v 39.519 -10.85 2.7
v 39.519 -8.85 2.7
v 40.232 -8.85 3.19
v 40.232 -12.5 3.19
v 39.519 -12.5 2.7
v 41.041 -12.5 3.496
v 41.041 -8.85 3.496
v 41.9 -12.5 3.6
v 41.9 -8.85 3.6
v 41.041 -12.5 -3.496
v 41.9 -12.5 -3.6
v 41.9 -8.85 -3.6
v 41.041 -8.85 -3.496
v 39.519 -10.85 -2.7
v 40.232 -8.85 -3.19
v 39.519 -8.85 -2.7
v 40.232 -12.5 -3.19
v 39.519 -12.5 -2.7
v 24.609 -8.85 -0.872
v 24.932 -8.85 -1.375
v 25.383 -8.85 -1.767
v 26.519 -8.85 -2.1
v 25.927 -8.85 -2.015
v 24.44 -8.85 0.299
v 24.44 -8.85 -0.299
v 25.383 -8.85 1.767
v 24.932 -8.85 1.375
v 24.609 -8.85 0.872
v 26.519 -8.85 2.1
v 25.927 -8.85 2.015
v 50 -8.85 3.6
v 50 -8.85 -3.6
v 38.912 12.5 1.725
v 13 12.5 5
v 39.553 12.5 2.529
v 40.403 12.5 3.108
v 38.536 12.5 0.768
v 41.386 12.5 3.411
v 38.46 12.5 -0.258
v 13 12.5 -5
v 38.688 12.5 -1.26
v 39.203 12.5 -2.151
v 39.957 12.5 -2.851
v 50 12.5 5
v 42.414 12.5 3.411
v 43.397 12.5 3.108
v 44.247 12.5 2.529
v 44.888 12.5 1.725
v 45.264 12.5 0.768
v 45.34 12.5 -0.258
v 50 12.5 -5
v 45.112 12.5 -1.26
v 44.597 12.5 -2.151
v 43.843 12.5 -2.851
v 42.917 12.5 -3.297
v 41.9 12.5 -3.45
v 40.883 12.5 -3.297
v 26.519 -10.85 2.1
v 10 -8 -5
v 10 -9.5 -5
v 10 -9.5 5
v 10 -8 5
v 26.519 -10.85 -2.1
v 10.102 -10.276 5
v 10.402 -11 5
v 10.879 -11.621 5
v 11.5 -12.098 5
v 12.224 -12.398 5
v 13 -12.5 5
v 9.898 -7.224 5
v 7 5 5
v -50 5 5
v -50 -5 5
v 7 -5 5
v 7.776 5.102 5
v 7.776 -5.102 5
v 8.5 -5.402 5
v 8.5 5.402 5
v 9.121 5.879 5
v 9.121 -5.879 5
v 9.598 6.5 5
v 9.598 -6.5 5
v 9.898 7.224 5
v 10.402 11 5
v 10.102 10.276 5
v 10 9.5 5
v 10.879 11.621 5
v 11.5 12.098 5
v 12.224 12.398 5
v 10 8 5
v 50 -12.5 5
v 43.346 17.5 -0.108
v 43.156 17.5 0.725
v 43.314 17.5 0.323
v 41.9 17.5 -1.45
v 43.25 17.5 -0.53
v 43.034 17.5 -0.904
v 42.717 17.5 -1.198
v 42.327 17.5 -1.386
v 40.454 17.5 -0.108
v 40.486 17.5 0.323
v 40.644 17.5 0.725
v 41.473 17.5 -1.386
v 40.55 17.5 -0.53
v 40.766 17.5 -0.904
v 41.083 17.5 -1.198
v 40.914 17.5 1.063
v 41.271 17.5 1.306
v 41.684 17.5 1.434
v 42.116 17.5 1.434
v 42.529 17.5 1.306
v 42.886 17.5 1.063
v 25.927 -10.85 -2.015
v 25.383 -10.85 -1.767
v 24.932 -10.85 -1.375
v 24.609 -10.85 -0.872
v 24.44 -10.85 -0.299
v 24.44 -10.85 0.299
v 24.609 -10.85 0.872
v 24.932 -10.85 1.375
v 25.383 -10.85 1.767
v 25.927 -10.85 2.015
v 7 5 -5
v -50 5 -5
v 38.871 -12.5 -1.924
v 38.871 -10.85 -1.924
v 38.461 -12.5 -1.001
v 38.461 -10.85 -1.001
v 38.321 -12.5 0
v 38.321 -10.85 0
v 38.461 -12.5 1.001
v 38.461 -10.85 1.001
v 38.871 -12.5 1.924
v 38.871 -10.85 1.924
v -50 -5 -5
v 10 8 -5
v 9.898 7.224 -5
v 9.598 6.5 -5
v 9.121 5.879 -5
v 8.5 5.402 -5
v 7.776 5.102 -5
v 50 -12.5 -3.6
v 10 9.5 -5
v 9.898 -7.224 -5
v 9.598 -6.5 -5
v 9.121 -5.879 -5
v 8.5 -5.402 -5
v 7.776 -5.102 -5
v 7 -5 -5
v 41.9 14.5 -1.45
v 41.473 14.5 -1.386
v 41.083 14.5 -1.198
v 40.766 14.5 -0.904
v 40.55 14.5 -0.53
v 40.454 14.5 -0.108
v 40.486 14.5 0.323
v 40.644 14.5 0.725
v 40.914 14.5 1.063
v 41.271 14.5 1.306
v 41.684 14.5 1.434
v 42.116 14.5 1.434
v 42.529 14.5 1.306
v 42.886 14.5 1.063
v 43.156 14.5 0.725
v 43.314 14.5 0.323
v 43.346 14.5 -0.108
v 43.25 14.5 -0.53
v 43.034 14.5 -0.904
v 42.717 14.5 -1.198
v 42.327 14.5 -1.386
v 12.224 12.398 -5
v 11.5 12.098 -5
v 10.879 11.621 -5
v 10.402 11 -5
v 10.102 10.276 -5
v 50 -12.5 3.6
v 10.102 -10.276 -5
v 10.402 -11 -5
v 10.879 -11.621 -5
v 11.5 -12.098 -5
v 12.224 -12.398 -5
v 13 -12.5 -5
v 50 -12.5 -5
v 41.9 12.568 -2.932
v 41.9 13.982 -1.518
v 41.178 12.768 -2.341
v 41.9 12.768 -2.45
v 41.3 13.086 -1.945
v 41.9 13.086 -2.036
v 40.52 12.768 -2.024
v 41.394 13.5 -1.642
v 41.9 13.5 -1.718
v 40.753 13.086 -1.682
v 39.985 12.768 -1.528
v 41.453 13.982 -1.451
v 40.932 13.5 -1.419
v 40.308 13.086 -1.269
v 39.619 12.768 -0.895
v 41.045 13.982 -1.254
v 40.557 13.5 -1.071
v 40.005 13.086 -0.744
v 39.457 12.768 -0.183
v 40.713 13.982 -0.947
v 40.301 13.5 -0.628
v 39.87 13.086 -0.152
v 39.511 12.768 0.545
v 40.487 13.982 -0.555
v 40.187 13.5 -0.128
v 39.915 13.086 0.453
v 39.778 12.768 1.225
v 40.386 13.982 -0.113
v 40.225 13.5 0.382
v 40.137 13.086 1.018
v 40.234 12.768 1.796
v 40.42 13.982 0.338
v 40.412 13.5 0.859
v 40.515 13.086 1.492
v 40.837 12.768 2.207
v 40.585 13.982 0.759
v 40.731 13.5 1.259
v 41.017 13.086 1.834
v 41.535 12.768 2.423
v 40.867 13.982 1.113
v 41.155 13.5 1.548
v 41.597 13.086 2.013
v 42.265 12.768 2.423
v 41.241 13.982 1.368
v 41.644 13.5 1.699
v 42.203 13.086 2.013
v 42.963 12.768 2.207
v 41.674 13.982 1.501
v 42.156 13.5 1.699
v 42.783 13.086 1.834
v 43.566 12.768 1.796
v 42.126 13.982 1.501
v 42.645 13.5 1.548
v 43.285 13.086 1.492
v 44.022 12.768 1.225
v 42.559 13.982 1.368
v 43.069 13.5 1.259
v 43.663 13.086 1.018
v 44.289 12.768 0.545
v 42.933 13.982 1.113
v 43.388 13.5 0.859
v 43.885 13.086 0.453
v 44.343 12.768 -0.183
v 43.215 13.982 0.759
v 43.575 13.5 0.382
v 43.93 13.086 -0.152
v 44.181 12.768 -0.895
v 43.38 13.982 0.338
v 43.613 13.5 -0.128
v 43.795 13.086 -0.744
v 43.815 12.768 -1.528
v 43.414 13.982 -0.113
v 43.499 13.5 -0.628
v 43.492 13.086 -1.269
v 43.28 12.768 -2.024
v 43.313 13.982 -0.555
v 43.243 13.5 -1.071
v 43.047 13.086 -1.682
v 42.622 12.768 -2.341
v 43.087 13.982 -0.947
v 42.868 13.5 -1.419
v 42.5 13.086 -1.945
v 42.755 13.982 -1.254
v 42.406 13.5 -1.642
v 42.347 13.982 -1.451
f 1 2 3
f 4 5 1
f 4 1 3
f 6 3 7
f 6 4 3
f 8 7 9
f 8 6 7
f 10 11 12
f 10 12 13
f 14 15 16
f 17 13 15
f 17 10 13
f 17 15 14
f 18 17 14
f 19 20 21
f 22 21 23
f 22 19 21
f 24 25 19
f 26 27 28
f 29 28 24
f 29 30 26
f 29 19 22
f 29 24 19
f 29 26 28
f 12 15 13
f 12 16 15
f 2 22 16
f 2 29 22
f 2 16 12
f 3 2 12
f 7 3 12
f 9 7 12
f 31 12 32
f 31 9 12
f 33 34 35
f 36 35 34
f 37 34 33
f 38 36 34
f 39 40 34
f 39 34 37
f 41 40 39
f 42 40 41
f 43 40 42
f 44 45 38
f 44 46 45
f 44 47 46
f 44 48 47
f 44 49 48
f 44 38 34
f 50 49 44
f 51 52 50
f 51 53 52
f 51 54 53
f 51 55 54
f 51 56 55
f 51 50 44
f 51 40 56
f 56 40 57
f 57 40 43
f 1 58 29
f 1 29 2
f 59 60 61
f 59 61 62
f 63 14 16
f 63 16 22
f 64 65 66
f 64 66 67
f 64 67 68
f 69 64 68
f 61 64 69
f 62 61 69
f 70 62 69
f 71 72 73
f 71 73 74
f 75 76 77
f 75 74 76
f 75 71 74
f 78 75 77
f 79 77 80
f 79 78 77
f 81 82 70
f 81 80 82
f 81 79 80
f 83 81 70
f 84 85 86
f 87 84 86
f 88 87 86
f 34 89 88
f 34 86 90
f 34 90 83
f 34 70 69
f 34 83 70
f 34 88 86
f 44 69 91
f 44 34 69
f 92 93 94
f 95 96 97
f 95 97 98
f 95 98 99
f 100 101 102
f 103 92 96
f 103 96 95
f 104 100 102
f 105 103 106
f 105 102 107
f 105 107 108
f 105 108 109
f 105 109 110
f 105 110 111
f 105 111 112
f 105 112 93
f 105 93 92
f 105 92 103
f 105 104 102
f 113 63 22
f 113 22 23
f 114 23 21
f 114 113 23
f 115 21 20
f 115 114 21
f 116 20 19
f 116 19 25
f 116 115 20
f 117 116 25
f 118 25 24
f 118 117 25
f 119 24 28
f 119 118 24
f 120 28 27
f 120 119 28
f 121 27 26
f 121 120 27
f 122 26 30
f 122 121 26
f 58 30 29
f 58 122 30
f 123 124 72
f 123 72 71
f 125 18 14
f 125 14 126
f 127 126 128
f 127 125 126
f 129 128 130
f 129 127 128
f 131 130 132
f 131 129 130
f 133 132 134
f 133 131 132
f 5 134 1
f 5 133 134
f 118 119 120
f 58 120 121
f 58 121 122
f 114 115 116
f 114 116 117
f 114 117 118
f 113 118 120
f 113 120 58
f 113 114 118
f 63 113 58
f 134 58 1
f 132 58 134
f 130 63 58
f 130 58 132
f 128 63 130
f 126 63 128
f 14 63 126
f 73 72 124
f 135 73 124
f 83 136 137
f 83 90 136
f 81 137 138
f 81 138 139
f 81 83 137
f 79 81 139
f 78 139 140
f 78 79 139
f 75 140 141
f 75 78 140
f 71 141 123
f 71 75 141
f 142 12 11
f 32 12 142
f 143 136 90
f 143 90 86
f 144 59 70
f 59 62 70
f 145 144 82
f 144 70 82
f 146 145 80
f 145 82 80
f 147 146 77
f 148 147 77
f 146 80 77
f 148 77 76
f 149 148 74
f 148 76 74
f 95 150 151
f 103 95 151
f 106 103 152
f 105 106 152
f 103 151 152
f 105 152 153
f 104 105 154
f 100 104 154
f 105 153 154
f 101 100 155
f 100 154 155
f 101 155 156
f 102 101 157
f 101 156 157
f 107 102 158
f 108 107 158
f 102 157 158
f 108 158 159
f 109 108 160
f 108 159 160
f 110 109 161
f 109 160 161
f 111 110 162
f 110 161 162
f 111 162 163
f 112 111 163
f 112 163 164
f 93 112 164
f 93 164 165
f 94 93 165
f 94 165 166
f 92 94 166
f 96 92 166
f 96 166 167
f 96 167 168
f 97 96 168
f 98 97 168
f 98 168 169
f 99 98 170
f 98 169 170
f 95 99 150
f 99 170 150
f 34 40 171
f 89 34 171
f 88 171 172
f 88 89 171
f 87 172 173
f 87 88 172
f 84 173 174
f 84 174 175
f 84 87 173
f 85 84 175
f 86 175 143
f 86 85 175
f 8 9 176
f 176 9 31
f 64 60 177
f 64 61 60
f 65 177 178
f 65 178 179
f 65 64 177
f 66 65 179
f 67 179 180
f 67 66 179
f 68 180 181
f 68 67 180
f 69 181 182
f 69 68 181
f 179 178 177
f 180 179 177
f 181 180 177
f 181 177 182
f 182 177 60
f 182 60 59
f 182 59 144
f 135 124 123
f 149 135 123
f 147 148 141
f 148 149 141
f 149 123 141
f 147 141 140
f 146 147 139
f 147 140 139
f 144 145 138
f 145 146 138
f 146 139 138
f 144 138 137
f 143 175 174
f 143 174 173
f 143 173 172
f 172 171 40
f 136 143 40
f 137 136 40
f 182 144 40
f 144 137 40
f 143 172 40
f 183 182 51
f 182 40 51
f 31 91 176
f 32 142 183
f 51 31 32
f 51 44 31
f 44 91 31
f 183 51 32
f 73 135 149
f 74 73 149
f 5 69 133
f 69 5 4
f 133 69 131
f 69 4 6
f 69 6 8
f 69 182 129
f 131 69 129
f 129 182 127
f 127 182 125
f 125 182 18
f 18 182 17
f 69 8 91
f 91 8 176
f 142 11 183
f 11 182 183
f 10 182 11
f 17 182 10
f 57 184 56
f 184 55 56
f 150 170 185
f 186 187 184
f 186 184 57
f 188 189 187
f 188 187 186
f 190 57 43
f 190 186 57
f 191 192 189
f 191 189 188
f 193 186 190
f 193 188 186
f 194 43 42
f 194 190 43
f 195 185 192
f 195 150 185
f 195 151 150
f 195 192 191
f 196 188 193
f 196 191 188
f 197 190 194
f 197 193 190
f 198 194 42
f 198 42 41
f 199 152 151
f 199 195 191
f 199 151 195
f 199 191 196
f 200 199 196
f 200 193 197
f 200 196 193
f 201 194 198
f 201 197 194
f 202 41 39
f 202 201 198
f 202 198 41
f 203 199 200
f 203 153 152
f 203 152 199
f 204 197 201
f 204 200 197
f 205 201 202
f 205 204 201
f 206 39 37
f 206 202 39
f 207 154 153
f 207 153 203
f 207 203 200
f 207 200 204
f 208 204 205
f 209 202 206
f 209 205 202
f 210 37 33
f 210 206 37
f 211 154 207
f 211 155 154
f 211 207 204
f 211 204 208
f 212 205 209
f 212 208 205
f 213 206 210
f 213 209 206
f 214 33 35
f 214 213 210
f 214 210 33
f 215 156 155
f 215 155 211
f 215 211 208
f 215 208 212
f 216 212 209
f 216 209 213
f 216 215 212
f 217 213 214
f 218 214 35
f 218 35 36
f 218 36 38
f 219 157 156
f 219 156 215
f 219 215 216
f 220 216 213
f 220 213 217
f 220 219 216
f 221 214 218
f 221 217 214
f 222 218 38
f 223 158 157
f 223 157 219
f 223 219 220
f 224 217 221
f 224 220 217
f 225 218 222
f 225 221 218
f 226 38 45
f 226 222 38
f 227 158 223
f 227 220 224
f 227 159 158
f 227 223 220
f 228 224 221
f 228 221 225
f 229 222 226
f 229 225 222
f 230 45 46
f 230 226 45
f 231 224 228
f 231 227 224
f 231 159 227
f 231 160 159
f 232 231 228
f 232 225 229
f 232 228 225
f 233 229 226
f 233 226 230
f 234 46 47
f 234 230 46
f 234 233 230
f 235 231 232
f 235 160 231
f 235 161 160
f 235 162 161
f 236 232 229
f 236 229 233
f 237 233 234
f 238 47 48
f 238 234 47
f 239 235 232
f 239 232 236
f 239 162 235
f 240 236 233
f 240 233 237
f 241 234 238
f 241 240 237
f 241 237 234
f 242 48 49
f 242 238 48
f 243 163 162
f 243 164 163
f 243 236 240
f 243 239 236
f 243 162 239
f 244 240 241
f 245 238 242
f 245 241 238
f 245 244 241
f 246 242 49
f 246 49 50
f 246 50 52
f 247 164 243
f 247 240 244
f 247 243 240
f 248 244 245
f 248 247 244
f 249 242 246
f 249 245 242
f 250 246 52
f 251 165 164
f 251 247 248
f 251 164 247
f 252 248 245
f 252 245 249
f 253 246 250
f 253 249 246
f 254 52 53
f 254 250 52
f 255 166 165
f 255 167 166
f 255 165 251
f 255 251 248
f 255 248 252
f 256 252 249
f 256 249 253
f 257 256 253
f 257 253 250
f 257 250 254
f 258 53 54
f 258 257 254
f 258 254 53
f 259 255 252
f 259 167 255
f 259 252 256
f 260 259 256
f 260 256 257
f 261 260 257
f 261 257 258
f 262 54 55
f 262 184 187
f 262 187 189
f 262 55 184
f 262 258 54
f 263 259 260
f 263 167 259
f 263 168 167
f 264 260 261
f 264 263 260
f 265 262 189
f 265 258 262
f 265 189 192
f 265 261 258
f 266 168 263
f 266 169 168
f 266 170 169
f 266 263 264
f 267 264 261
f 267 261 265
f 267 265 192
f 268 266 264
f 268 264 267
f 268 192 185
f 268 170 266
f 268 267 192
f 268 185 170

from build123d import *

# Parameters (mm, degrees)
SKETCH2_W               = 100
SKETCH2_H               = 10
BOSS_EXTRUDE2_DEPTH     = 12.5
CAVITY1_START           = -10.85
CAVITY1_OUTLINE_R       = 1.325
CAVITY1_DEPTH           = 2
CAVITY1_START_2         = -12.5
CAVITY1_2_OUTLINE_R     = 2.1
CAVITY1_2_DEPTH         = 1.65
CUT_EXTRUDE1_START      = -3.65
SKETCH3_R               = 2.1
CUT_EXTRUDE1_DEPTH      = 3.65
SKETCH4_W               = 8.1
SKETCH4_H               = 7.2
CUT_EXTRUDE2_DEPTH      = 3.65
SKETCH5_R               = 1.45
BOSS_EXTRUDE3_DEPTH     = 5
FILLET1_R               = 2
CUT_EXTRUDE3_DEPTH      = 54.909646632
CUT_EXTRUDE3_DEPTH_BACK = 54.909646632
SKETCH6_W               = 60
SKETCH6_H               = 7.5
FILLET2_R               = 3


# Read off the part's stored shape, not the designer's step: Cavity1
with BuildPart() as part:
    # Sketch2 → Boss-Extrude2 (new, symmetric)
    with BuildSketch(Plane(origin=(0, 0, 0), x_dir=(1, 0, 0), z_dir=(0, 1, 0))):
        Rectangle(SKETCH2_W, SKETCH2_H)
    extrude(amount=BOSS_EXTRUDE2_DEPTH, both=True)

    # Cavity1 outline → Cavity1 (cut)
    with BuildSketch(Plane(origin=(0, 0, 0), x_dir=(1, 0, 0), z_dir=(0, 1, 0)).offset(CAVITY1_START)):
        with BuildLine():
            Line((26.51882382, -2.1), (39.51882382, -2.7))
            ThreePointArc((39.51882382, -2.7), (45.5, 0), (39.51882382, 2.7))
            Line((39.51882382, 2.7), (26.51882382, 2.1))
            ThreePointArc((26.51882382, 2.1), (24.41882382, 0), (26.51882382, -2.1))
        make_face()
        with Locations((41.9, 0)):
            Circle(CAVITY1_OUTLINE_R, mode=Mode.SUBTRACT)
    extrude(amount=CAVITY1_DEPTH, mode=Mode.SUBTRACT)

    # Cavity1 2 outline → Cavity1 2 (cut)
    with BuildSketch(Plane(origin=(0, 0, 0), x_dir=(1, 0, 0), z_dir=(0, 1, 0)).offset(CAVITY1_START_2)):
        with BuildLine():
            ThreePointArc((39.51882382, -2.7), (45.5, 0), (39.51882382, 2.7))
            ThreePointArc((39.51882382, 2.7), (38.320838024, 0), (39.51882382, -2.7))
        make_face()
        with Locations((41.9, 0)):
            Circle(CAVITY1_2_OUTLINE_R, mode=Mode.SUBTRACT)
    extrude(amount=CAVITY1_2_DEPTH, mode=Mode.SUBTRACT)

    # Sketch3 → Cut-Extrude1 (cut)
    with BuildSketch(Plane.XZ.offset(12.5).offset(CUT_EXTRUDE1_START)):
        with Locations((41.9, 0)):
            Circle(SKETCH3_R)
    extrude(amount=CUT_EXTRUDE1_DEPTH, mode=Mode.SUBTRACT)

    # Sketch4 → Cut-Extrude2 (cut)
    with BuildSketch(Plane.XZ.offset(8.85)):
        with Locations((45.95, 0)):
            Rectangle(SKETCH4_W, SKETCH4_H)
    extrude(amount=CUT_EXTRUDE2_DEPTH, mode=Mode.SUBTRACT)

    # Sketch5 → Boss-Extrude3 (add)
    with BuildSketch(Plane(origin=(0, 12.5, 0), x_dir=(1, 0, 0), z_dir=(0, 1, 0))):
        with Locations(Location((41.9, 0, 0), (0, 0, 90))):
            Circle(SKETCH5_R)
    extrude(amount=BOSS_EXTRUDE3_DEPTH)

    # Fillet1
    fillet1_edges = [part.edges().sort_by_distance(p)[0] for p in [
        (41.9, 12.5, 1.45),
    ]]
    fillet(fillet1_edges, radius=FILLET1_R)

    # Sketch6 → Cut-Extrude3 (cut, two sides: drawn at the far end of the back side and taken through both)
    with BuildSketch(Plane.XY.offset(5).offset(-CUT_EXTRUDE3_DEPTH_BACK)):
        with Locations((-20, 8.75)):
            Rectangle(SKETCH6_W, SKETCH6_H)
        with Locations((-20, -8.75)):
            Rectangle(SKETCH6_W, SKETCH6_H)
    extrude(amount=CUT_EXTRUDE3_DEPTH + CUT_EXTRUDE3_DEPTH_BACK, mode=Mode.SUBTRACT)

    # Fillet2
    fillet2_edges = [part.edges().sort_by_distance(p)[0] for p in [
        (10, 5, 0),
        (10, 12.5, 0),
        (10, -12.5, 0),
        (10, -5, 0),
    ]]
    fillet(fillet2_edges, radius=FILLET2_R)


solid = part.part
